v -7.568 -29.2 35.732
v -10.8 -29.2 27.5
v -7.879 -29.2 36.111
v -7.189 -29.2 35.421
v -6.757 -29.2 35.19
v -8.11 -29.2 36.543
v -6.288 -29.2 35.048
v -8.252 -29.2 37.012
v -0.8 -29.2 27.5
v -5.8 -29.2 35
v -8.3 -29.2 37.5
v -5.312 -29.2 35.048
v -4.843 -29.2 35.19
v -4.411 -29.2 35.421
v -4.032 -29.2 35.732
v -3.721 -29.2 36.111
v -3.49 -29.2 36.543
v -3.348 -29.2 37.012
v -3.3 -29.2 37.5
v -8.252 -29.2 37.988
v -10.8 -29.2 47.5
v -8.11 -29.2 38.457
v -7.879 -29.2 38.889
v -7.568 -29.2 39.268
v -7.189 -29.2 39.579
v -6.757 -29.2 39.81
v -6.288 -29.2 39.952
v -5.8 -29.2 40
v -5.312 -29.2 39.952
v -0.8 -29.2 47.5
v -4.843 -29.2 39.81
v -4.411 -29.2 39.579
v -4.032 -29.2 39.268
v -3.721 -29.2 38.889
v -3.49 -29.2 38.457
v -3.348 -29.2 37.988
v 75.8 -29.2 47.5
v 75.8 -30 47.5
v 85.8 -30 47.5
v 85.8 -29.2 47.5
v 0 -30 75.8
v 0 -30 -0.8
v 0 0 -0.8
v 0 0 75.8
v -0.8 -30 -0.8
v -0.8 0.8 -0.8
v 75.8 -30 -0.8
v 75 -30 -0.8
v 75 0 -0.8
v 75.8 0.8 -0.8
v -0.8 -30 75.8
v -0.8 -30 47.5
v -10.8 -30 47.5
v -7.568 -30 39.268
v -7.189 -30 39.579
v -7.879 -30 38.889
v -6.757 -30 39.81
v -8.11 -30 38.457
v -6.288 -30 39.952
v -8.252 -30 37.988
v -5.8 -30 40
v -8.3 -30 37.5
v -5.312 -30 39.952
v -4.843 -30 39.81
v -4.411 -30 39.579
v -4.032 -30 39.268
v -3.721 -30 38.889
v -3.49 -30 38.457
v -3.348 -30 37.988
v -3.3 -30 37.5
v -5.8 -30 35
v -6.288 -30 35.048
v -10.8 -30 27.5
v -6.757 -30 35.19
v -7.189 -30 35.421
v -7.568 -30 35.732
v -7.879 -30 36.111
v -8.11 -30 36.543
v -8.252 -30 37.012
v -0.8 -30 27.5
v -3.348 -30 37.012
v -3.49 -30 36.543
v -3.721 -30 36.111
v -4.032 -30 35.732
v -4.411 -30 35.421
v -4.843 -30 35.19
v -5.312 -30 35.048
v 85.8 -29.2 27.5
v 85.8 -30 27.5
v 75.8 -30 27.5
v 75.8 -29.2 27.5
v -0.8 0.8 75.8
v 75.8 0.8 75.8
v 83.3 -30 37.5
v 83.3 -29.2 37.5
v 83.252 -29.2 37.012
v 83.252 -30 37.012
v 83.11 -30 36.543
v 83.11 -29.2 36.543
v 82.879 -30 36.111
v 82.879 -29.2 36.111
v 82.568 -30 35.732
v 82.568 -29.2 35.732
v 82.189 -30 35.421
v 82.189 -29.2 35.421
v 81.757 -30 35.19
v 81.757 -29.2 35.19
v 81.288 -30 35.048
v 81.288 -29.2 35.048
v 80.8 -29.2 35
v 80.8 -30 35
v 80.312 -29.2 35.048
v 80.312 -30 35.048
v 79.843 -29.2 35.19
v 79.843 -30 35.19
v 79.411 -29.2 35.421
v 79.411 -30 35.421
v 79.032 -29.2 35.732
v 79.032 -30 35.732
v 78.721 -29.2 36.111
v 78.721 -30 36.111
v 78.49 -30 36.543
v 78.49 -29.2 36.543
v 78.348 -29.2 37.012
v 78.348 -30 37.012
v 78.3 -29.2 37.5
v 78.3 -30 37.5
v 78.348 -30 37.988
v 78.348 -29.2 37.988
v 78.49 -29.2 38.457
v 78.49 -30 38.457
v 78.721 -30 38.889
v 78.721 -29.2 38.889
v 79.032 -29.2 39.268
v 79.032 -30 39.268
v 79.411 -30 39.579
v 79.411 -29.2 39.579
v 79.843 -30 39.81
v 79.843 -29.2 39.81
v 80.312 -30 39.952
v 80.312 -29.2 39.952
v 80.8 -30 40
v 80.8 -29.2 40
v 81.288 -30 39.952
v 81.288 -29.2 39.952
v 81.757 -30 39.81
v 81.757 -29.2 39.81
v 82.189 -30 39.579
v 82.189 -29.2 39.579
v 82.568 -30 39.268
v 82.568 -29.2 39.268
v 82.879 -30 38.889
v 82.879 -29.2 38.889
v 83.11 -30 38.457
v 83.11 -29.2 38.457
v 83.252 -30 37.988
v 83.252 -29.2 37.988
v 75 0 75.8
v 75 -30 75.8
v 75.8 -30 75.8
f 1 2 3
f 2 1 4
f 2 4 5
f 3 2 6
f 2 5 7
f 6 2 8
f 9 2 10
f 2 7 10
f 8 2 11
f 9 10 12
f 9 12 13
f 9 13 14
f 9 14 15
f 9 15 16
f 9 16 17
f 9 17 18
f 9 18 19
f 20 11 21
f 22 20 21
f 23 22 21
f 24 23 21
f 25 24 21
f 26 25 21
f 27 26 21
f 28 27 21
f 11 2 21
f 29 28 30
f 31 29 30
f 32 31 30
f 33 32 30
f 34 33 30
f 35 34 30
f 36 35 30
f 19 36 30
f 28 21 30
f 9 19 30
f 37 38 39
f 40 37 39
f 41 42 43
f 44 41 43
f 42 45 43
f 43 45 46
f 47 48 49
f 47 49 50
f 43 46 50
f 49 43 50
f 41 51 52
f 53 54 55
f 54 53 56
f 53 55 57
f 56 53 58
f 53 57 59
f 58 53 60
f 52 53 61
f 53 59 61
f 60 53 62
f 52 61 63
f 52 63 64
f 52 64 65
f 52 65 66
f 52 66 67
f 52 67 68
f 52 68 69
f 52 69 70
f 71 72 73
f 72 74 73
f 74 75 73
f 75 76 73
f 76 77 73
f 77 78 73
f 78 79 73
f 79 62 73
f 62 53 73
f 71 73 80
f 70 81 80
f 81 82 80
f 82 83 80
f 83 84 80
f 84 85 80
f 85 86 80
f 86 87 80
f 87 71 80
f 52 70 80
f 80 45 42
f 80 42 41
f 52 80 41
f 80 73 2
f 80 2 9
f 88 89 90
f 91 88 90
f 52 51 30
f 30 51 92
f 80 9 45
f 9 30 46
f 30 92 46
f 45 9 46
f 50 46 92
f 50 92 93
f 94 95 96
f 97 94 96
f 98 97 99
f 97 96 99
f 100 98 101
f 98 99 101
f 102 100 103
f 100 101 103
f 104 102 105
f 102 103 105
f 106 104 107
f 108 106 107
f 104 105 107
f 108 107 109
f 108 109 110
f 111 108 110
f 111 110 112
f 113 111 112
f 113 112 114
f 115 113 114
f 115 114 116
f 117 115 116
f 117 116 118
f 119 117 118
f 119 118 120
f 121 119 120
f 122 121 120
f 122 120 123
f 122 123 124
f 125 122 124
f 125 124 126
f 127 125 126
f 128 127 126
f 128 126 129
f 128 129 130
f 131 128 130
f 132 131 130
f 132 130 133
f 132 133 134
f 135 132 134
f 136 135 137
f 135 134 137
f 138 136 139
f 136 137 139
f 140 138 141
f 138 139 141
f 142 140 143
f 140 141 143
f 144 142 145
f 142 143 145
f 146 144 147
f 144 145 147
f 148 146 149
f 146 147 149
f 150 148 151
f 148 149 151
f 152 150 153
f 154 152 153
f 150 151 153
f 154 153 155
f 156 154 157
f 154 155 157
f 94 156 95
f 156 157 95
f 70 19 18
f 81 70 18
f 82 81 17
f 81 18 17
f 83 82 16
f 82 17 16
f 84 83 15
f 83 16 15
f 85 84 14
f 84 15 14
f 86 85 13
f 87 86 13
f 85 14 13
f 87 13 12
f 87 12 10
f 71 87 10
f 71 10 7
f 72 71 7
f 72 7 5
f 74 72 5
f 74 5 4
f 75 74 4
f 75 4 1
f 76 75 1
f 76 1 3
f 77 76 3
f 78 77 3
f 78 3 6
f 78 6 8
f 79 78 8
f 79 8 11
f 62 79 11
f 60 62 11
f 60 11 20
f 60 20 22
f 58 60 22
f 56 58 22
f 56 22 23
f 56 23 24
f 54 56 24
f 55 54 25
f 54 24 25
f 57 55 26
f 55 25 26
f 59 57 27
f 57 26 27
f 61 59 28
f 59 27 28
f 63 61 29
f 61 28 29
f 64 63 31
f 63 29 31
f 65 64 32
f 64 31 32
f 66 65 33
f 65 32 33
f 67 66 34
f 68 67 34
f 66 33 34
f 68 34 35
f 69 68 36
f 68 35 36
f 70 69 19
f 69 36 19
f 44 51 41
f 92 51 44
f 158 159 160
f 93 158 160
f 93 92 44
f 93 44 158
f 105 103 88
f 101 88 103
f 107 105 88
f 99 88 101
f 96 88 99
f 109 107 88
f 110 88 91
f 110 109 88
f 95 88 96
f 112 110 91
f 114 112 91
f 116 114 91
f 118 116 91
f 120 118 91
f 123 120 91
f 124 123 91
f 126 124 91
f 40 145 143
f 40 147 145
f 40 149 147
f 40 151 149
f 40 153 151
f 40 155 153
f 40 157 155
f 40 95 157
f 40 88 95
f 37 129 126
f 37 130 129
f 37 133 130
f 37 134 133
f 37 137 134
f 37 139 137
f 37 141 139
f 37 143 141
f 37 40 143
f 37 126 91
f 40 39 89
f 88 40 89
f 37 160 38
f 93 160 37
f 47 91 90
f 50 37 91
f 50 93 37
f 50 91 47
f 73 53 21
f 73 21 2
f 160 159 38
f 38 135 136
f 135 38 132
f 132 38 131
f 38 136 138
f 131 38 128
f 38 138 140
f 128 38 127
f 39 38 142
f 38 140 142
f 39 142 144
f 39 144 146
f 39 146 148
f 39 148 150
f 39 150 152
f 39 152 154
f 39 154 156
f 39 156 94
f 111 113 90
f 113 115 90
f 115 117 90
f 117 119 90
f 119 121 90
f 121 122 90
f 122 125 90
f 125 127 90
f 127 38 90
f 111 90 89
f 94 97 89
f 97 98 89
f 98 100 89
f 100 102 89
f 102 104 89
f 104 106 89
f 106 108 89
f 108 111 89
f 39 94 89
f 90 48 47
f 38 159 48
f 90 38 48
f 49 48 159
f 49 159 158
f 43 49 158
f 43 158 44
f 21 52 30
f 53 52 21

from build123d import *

# Parameters (mm, degrees)
SKETCH_1_W          = 75
SKETCH_1_H          = 75
EXTRUDE_1_DEPTH     = 0.8
SKETCH_2_W          = 76.6
SKETCH_2_H          = 76.6
SKETCH_2_W_2        = 75
SKETCH_2_H_2        = 75
EXTRUDE_2_DEPTH     = 30.8
EXTRUDE_3_DEPTH     = 0.8
F_5_0MM_1_D         = 5
SKETCH_8_W          = 75
SKETCH_8_H          = 30
CUT_EXTRUDE_1_DEPTH = 119.86631146


with BuildPart() as part:
    # 草图1 → 凸台-拉伸1 (new body)
    with BuildSketch(Plane(origin=(0, 0, 0), x_dir=(1, 0, 0), z_dir=(0, 1, 0))):
        with Locations((37.5, -37.5)):
            Rectangle(SKETCH_1_W, SKETCH_1_H)
    extrude(amount=EXTRUDE_1_DEPTH)

    # 草图2 → 凸台-拉伸2 (add)
    with BuildSketch(Plane(origin=(0, 0.8, 0), x_dir=(1, 0, 0), z_dir=(0, 1, 0))):
        with Locations((37.5, -37.5)):
            Rectangle(SKETCH_2_W, SKETCH_2_H)
        with Locations((37.5, -37.5)):
            Rectangle(SKETCH_2_W_2, SKETCH_2_H_2, mode=Mode.SUBTRACT)
    extrude(amount=-EXTRUDE_2_DEPTH)

    # 草图3 → 凸台-拉伸3 (add)
    with BuildSketch(Plane.XZ.offset(30)):
        Polygon((-0.8, 37.5), (-0.8, 47.5), (-10.8, 47.5), (-10.8, 27.5), (-0.8, 27.5), align=None)
        Polygon((75.8, 27.5), (75.8, 37.5), (75.8, 47.5), (85.8, 47.5), (85.8, 27.5), align=None)
    extrude(amount=-EXTRUDE_3_DEPTH)

    # Ø5.0mm 暗销孔1 (through all)
    with Locations(Plane(origin=(0, -30, 0), x_dir=(-1, 0, 0), z_dir=(0, -1, 0))):
        with Locations((5.8, -37.5), (-80.8, -37.5)):
            Hole(F_5_0MM_1_D / 2)

    # 草图8 → 切除-拉伸1 (cut, through all)
    with BuildSketch(Plane(origin=(0, 0, -0.8), x_dir=(-1, 0, 0), z_dir=(0, 0, -1))):
        with Locations((-37.5, -15)):
            Rectangle(SKETCH_8_W, SKETCH_8_H)
    extrude(amount=-CUT_EXTRUDE_1_DEPTH, mode=Mode.SUBTRACT)


solid = part.part
